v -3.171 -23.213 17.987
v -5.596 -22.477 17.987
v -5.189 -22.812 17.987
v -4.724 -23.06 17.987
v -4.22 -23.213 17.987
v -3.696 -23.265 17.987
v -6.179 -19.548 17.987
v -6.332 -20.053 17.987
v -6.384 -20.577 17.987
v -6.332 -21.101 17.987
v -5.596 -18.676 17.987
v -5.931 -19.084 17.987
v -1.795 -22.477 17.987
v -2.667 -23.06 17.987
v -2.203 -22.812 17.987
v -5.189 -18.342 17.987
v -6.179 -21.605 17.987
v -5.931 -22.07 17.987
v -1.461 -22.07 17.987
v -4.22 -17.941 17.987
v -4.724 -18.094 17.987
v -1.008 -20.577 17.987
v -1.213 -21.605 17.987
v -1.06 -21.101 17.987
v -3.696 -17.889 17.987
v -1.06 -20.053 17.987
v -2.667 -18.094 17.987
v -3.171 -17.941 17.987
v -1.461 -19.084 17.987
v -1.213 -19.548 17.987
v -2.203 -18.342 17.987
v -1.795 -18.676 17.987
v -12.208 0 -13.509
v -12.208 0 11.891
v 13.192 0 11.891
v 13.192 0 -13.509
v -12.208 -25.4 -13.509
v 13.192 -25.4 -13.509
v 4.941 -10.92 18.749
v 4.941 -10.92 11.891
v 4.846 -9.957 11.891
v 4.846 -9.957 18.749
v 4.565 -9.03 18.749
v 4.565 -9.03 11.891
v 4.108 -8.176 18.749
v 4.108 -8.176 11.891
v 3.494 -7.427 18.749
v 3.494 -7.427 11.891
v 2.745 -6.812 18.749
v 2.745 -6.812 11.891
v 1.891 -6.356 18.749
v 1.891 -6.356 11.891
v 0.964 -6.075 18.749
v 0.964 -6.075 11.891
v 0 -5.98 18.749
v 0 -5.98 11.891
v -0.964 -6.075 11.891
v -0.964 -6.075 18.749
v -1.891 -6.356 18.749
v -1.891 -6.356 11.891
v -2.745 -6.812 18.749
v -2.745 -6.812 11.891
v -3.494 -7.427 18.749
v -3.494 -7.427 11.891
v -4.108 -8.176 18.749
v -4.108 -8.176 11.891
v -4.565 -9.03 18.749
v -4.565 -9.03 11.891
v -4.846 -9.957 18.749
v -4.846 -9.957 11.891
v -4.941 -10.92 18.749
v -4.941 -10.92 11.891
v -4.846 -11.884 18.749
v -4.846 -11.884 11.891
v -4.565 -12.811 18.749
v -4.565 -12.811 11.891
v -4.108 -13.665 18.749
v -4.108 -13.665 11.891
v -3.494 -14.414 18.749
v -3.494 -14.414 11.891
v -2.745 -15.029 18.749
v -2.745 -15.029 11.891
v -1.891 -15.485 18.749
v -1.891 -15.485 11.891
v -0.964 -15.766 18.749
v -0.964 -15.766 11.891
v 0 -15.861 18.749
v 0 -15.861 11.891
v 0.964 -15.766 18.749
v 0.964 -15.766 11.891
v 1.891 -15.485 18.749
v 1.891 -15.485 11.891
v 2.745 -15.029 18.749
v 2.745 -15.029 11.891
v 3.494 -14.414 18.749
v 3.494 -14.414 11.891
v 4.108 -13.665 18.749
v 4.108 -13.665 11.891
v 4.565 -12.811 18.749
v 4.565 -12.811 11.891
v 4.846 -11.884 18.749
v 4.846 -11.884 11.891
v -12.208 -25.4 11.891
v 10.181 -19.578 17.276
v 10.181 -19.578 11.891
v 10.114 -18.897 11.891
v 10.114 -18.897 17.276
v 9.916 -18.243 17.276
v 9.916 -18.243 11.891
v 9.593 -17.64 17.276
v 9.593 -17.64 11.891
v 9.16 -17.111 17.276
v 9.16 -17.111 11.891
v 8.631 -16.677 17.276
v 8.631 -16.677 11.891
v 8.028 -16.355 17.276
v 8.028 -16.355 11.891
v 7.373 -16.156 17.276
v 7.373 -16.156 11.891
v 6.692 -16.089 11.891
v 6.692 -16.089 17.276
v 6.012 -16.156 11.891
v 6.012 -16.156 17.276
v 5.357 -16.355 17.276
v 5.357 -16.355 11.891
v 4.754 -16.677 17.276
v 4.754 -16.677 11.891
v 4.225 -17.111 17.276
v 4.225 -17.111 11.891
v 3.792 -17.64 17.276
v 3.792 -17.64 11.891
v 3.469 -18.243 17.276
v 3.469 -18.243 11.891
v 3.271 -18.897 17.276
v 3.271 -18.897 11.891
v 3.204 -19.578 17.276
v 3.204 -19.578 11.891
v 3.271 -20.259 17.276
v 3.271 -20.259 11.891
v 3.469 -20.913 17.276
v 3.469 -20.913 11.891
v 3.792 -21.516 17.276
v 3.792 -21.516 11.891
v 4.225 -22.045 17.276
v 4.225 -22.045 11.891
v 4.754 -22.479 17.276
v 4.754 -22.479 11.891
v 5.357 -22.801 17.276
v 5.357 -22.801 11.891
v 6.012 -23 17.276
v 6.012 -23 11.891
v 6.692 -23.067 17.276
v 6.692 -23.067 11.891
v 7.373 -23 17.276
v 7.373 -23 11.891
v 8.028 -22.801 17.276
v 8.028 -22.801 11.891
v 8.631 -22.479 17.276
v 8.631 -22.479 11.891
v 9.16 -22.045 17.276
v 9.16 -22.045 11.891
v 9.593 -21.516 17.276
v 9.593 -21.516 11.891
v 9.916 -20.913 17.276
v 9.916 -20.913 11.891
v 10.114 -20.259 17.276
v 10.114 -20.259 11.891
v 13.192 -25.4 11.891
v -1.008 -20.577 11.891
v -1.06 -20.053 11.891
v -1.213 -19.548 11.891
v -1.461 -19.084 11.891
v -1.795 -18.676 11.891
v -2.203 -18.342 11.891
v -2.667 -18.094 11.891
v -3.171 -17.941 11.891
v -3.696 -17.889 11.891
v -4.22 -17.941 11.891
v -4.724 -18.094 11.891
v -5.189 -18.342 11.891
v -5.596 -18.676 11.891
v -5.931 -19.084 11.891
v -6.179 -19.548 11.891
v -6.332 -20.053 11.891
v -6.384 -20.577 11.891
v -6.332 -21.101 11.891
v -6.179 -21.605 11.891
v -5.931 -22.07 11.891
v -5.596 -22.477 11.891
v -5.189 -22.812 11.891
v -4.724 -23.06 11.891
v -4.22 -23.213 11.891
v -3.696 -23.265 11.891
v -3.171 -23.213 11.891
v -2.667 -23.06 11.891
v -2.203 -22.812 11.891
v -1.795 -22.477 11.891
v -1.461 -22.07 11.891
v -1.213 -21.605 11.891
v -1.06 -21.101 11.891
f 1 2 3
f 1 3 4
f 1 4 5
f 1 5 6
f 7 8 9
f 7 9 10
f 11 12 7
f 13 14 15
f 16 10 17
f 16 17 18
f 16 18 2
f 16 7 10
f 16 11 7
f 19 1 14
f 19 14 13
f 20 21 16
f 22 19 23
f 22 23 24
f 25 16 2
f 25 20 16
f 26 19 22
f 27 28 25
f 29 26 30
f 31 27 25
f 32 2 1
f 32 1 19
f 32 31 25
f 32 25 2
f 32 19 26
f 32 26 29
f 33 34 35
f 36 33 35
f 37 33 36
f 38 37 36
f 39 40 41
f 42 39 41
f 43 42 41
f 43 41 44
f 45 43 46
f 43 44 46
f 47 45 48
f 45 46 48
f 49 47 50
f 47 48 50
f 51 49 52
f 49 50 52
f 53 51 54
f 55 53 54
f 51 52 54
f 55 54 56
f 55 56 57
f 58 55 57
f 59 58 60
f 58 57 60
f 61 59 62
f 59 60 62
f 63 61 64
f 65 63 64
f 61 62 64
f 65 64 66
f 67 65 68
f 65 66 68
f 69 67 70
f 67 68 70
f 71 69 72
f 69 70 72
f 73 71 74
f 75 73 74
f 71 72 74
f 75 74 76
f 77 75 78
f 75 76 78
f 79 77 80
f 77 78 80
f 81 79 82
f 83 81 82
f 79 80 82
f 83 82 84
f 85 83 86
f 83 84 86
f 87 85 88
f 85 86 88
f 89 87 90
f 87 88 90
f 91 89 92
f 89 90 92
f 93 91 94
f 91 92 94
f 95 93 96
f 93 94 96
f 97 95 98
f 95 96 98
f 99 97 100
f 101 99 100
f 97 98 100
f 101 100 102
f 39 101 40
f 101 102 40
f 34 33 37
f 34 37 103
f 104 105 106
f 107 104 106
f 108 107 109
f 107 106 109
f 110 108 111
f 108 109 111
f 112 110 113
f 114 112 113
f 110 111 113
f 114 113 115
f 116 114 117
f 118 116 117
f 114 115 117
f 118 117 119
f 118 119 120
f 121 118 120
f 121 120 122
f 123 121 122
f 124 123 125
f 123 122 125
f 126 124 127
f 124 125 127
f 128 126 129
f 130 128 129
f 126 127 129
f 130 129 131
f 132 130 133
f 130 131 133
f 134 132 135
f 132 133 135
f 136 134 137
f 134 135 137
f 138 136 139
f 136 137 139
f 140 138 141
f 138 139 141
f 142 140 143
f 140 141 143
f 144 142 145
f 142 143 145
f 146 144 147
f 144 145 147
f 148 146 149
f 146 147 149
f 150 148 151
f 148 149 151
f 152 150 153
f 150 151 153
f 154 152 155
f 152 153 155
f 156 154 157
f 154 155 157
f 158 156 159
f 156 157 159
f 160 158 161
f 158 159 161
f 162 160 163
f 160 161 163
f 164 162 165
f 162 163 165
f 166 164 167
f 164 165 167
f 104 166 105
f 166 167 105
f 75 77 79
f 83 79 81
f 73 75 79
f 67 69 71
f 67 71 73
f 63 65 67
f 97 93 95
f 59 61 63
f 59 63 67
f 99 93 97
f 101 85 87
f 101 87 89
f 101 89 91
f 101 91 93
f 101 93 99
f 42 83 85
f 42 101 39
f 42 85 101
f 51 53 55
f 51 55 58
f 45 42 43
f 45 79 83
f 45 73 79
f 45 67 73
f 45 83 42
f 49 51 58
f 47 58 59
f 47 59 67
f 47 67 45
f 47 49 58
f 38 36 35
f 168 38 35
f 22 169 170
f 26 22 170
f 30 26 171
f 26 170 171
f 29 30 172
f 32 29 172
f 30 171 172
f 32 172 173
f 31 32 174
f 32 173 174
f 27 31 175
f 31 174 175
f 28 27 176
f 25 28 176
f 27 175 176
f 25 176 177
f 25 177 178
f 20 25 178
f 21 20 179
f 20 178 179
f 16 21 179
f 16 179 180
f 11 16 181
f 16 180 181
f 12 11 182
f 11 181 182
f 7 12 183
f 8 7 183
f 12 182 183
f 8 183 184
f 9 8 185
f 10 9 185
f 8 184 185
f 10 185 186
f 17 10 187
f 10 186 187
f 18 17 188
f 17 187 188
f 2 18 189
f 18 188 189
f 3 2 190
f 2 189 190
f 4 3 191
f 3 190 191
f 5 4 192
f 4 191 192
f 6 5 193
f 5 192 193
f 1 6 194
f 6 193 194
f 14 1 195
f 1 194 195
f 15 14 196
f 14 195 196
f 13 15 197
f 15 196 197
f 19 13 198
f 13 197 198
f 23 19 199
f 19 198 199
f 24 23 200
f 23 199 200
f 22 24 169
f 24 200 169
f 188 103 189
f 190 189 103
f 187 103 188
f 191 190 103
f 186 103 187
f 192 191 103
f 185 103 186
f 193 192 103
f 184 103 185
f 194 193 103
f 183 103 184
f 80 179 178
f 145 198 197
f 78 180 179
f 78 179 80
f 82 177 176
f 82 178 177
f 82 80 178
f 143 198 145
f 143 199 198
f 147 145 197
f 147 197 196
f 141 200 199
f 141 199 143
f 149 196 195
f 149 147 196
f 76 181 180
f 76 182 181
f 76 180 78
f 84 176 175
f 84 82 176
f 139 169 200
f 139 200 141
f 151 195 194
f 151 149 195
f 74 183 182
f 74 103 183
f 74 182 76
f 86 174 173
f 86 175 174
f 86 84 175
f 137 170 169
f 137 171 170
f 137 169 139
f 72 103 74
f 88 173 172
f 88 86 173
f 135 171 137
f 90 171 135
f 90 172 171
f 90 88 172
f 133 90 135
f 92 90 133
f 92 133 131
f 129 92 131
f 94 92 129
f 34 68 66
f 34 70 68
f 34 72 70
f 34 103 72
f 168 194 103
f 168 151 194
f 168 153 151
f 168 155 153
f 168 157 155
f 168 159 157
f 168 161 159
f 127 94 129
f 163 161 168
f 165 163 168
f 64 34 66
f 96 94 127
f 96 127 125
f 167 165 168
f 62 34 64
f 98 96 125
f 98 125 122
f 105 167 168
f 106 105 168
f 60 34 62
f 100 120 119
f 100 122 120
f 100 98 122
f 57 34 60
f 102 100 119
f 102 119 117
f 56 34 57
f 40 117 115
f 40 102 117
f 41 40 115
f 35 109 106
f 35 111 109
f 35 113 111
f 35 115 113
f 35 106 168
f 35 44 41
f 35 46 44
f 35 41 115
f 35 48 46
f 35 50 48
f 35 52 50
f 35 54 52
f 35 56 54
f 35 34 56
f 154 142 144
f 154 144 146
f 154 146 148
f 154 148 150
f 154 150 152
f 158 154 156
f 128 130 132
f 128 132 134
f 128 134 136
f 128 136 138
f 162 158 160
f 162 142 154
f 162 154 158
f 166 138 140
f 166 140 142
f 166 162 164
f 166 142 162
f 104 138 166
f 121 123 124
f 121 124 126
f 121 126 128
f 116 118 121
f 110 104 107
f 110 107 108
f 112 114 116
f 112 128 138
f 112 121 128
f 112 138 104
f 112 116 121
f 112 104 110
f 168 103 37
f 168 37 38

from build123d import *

# Parameters (mm, degrees)
F0_W     = 25.4
F0_H     = 25.4
F1_DEPTH = 25.4
F2_R     = 4.940733
F3_DEPTH = 6.858
F4_R     = 2.6877
F5_DEPTH = 6.096
F6_R     = 3.488924
F7_DEPTH = 5.3848


with BuildPart() as f1:
    # F0 (on Front) → F1 (new body)
    with BuildSketch(Plane.XZ):
        with Locations((0.491789, -0.80908)):
            Rectangle(F0_W, F0_H)
    extrude(amount=F1_DEPTH)

    # F2 (on face) → F3 (join)
    with BuildSketch(Plane.XY.offset(11.89092)):
        with Locations((0, -10.92047)):
            Circle(F2_R)
    extrude(amount=F3_DEPTH)

    # F4 (on face) → F5 (join)
    with BuildSketch(Plane.XY.offset(11.89092)):
        with Locations((-3.695844, -20.576853)):
            Circle(F4_R)
    extrude(amount=F5_DEPTH)

    # F6 (on face) → F7 (join)
    with BuildSketch(Plane.XY.offset(11.89092)):
        with Locations((6.692471, -19.577978)):
            Circle(F6_R)
    extrude(amount=F7_DEPTH)


solid = f1.part
